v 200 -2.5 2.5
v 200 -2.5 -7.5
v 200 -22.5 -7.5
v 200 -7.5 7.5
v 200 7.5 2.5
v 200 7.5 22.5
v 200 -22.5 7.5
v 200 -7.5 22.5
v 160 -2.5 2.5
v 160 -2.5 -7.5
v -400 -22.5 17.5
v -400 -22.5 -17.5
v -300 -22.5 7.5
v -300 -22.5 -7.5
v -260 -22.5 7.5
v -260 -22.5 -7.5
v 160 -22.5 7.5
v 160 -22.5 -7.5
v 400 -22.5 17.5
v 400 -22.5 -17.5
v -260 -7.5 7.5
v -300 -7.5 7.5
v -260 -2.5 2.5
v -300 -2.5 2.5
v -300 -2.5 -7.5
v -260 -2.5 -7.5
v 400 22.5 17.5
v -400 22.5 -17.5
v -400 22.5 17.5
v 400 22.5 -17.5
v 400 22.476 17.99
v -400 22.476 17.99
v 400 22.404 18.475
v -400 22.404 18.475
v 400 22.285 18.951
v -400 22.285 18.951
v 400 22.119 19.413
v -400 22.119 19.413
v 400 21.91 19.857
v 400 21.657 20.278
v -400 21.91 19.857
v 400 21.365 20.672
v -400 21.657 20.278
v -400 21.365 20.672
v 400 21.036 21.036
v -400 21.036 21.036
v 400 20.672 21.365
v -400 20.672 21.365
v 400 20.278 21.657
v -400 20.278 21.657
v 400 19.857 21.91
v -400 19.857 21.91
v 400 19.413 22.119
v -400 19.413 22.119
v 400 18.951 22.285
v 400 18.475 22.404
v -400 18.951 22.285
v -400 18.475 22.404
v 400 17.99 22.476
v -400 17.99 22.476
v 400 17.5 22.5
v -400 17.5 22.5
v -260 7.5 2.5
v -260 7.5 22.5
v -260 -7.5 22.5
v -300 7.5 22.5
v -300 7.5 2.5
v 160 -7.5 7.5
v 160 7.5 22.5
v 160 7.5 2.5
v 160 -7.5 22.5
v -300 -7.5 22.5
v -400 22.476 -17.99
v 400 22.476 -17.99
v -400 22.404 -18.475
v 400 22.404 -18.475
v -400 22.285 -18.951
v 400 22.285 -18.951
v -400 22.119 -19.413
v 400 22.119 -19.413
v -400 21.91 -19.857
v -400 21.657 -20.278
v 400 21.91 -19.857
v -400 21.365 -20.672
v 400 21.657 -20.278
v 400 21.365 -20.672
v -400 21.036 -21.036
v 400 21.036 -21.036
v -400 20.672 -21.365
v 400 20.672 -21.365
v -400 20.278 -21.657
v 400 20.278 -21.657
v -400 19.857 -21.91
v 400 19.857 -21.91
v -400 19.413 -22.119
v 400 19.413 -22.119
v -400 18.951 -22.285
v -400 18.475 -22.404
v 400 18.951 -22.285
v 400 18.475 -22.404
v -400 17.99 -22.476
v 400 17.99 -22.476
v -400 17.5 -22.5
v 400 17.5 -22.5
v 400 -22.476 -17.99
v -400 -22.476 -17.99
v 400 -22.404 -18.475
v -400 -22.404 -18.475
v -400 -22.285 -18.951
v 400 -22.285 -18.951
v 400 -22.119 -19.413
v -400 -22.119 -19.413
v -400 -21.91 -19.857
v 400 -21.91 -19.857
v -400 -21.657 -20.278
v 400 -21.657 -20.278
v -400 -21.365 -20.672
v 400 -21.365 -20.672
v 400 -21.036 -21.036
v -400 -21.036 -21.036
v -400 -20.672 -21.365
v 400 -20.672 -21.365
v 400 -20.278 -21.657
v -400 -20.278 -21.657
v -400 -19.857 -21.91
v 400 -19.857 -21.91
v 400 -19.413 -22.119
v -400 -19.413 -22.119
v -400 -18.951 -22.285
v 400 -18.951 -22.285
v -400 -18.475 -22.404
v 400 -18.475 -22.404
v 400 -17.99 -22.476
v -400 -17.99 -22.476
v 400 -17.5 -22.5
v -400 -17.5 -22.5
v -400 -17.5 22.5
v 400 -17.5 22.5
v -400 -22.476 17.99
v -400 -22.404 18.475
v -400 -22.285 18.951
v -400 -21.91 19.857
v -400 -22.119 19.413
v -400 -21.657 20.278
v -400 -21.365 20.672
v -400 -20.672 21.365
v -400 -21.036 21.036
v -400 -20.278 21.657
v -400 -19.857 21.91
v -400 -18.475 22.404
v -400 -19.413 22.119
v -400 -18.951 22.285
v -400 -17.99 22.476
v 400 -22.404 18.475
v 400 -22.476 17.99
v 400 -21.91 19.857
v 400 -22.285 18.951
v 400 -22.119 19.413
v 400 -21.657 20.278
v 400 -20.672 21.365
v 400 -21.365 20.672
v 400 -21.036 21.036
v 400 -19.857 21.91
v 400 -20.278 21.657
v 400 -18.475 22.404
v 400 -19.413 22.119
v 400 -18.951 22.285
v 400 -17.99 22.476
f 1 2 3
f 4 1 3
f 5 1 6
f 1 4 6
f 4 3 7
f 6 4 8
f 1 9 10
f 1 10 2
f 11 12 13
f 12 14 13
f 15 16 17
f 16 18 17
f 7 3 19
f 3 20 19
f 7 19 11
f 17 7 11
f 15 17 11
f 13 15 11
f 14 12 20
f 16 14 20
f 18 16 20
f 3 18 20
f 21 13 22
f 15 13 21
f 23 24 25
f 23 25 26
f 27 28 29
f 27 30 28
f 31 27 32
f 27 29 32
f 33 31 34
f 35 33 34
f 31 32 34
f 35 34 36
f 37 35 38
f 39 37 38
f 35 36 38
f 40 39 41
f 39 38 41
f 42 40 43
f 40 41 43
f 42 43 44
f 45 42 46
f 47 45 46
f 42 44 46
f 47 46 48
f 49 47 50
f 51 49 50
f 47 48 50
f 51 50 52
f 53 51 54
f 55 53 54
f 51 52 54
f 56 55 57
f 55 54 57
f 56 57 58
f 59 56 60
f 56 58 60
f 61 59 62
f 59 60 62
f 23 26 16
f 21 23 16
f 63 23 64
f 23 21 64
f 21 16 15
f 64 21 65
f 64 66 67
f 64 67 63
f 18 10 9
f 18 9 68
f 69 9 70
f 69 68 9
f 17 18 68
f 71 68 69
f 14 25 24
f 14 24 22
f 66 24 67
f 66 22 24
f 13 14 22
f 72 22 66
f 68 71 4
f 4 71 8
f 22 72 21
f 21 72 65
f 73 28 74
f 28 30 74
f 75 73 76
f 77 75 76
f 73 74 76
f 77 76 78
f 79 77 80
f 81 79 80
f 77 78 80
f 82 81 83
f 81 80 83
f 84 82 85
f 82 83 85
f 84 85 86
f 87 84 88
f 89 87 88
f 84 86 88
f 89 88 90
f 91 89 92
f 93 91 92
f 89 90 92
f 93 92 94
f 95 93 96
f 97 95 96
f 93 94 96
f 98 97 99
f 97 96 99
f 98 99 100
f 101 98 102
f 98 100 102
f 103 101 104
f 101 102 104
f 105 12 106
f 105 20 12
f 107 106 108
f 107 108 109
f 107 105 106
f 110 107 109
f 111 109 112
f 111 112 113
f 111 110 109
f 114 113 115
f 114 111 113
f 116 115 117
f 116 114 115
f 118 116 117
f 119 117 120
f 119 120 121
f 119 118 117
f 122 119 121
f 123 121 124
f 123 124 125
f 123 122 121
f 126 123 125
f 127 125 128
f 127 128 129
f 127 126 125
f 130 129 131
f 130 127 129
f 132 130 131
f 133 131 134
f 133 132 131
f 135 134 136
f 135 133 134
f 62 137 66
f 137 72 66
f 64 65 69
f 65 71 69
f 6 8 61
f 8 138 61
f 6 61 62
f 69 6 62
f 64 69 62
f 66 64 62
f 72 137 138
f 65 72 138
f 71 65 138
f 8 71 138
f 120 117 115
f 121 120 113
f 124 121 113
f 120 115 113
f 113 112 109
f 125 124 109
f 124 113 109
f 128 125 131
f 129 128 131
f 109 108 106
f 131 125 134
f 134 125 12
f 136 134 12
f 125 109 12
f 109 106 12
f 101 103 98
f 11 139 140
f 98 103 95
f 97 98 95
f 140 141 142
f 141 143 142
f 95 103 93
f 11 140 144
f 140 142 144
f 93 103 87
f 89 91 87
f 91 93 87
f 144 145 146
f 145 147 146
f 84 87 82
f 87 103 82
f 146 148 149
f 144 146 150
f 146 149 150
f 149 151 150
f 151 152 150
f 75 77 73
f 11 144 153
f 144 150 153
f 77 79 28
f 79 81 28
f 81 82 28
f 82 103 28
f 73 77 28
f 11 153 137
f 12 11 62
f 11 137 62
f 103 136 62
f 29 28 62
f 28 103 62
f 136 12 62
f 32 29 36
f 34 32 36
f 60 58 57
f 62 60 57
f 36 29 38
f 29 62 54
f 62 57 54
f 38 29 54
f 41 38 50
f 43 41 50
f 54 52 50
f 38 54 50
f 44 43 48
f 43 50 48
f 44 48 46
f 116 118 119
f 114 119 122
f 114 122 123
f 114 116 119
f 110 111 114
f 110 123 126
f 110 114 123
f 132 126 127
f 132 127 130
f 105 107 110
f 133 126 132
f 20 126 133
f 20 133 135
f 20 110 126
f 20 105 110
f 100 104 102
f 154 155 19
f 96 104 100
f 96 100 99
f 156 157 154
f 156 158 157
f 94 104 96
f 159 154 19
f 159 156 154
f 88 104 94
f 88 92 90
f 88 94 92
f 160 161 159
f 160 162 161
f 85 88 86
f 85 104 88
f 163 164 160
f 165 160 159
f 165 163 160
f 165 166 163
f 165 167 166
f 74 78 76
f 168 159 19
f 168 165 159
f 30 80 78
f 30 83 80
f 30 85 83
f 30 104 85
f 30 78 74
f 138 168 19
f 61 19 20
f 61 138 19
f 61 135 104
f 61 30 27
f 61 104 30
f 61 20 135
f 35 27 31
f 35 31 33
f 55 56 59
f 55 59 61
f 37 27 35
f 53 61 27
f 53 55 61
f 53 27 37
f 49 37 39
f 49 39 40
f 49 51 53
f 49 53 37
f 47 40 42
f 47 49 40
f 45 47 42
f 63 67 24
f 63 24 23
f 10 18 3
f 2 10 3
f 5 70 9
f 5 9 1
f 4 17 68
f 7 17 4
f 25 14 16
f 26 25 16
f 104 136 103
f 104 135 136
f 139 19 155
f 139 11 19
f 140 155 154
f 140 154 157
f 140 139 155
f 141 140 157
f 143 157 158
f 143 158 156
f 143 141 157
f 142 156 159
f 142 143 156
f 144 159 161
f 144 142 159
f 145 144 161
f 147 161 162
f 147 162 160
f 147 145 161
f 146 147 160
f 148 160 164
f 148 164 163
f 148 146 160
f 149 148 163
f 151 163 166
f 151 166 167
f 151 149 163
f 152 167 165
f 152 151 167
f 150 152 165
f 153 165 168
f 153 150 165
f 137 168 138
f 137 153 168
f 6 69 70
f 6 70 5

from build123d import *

# Parameters (mm, degrees)
F0_W      = 45
F0_H      = 45
F1_DEPTH  = 400
F2_R      = 5
F3_W      = 40
F3_H      = 15
F4_DEPTH  = 20
F5_W      = 40
F5_H      = 15
F6_DEPTH  = 20
F7_W      = 40
F7_H      = 15
F8_DEPTH  = 20
F9_W      = 40
F9_H      = 15
F10_DEPTH = 20


with BuildPart() as f1:
    # F0 (on Right) → F1 (new body, symmetric)
    with BuildSketch(Plane.YZ):
        Rectangle(F0_W, F0_H)
    extrude(amount=F1_DEPTH, both=True)

    # F2
    f2_edges = [f1.edges().sort_by_distance(p)[0] for p in [
        (0, -22.5, 22.5),
        (0, 22.5, 22.5),
        (0, -22.5, -22.5),
        (0, 22.5, -22.5),
    ]]
    fillet(f2_edges, radius=F2_R)

    # F3 (on face) → F4 (cut)
    with BuildSketch(Plane.XZ.offset(22.5)):
        with Locations((-280, 0)):
            Rectangle(F3_W, F3_H)
    extrude(amount=-F4_DEPTH, mode=Mode.SUBTRACT)

    # F5 (on face) → F6 (cut)
    with BuildSketch(Plane.XY.offset(22.5)):
        with Locations((-280, 0)):
            Rectangle(F5_W, F5_H)
    extrude(amount=-F6_DEPTH, mode=Mode.SUBTRACT)

    # F7 (on face) → F8 (cut)
    with BuildSketch(Plane.XY.offset(22.5)):
        with Locations((180, 0)):
            Rectangle(F7_W, F7_H)
    extrude(amount=-F8_DEPTH, mode=Mode.SUBTRACT)

    # F9 (on face) → F10 (cut)
    with BuildSketch(Plane.XZ.offset(22.5)):
        with Locations((180, 0)):
            Rectangle(F9_W, F9_H)
    extrude(amount=-F10_DEPTH, mode=Mode.SUBTRACT)


solid = f1.part
